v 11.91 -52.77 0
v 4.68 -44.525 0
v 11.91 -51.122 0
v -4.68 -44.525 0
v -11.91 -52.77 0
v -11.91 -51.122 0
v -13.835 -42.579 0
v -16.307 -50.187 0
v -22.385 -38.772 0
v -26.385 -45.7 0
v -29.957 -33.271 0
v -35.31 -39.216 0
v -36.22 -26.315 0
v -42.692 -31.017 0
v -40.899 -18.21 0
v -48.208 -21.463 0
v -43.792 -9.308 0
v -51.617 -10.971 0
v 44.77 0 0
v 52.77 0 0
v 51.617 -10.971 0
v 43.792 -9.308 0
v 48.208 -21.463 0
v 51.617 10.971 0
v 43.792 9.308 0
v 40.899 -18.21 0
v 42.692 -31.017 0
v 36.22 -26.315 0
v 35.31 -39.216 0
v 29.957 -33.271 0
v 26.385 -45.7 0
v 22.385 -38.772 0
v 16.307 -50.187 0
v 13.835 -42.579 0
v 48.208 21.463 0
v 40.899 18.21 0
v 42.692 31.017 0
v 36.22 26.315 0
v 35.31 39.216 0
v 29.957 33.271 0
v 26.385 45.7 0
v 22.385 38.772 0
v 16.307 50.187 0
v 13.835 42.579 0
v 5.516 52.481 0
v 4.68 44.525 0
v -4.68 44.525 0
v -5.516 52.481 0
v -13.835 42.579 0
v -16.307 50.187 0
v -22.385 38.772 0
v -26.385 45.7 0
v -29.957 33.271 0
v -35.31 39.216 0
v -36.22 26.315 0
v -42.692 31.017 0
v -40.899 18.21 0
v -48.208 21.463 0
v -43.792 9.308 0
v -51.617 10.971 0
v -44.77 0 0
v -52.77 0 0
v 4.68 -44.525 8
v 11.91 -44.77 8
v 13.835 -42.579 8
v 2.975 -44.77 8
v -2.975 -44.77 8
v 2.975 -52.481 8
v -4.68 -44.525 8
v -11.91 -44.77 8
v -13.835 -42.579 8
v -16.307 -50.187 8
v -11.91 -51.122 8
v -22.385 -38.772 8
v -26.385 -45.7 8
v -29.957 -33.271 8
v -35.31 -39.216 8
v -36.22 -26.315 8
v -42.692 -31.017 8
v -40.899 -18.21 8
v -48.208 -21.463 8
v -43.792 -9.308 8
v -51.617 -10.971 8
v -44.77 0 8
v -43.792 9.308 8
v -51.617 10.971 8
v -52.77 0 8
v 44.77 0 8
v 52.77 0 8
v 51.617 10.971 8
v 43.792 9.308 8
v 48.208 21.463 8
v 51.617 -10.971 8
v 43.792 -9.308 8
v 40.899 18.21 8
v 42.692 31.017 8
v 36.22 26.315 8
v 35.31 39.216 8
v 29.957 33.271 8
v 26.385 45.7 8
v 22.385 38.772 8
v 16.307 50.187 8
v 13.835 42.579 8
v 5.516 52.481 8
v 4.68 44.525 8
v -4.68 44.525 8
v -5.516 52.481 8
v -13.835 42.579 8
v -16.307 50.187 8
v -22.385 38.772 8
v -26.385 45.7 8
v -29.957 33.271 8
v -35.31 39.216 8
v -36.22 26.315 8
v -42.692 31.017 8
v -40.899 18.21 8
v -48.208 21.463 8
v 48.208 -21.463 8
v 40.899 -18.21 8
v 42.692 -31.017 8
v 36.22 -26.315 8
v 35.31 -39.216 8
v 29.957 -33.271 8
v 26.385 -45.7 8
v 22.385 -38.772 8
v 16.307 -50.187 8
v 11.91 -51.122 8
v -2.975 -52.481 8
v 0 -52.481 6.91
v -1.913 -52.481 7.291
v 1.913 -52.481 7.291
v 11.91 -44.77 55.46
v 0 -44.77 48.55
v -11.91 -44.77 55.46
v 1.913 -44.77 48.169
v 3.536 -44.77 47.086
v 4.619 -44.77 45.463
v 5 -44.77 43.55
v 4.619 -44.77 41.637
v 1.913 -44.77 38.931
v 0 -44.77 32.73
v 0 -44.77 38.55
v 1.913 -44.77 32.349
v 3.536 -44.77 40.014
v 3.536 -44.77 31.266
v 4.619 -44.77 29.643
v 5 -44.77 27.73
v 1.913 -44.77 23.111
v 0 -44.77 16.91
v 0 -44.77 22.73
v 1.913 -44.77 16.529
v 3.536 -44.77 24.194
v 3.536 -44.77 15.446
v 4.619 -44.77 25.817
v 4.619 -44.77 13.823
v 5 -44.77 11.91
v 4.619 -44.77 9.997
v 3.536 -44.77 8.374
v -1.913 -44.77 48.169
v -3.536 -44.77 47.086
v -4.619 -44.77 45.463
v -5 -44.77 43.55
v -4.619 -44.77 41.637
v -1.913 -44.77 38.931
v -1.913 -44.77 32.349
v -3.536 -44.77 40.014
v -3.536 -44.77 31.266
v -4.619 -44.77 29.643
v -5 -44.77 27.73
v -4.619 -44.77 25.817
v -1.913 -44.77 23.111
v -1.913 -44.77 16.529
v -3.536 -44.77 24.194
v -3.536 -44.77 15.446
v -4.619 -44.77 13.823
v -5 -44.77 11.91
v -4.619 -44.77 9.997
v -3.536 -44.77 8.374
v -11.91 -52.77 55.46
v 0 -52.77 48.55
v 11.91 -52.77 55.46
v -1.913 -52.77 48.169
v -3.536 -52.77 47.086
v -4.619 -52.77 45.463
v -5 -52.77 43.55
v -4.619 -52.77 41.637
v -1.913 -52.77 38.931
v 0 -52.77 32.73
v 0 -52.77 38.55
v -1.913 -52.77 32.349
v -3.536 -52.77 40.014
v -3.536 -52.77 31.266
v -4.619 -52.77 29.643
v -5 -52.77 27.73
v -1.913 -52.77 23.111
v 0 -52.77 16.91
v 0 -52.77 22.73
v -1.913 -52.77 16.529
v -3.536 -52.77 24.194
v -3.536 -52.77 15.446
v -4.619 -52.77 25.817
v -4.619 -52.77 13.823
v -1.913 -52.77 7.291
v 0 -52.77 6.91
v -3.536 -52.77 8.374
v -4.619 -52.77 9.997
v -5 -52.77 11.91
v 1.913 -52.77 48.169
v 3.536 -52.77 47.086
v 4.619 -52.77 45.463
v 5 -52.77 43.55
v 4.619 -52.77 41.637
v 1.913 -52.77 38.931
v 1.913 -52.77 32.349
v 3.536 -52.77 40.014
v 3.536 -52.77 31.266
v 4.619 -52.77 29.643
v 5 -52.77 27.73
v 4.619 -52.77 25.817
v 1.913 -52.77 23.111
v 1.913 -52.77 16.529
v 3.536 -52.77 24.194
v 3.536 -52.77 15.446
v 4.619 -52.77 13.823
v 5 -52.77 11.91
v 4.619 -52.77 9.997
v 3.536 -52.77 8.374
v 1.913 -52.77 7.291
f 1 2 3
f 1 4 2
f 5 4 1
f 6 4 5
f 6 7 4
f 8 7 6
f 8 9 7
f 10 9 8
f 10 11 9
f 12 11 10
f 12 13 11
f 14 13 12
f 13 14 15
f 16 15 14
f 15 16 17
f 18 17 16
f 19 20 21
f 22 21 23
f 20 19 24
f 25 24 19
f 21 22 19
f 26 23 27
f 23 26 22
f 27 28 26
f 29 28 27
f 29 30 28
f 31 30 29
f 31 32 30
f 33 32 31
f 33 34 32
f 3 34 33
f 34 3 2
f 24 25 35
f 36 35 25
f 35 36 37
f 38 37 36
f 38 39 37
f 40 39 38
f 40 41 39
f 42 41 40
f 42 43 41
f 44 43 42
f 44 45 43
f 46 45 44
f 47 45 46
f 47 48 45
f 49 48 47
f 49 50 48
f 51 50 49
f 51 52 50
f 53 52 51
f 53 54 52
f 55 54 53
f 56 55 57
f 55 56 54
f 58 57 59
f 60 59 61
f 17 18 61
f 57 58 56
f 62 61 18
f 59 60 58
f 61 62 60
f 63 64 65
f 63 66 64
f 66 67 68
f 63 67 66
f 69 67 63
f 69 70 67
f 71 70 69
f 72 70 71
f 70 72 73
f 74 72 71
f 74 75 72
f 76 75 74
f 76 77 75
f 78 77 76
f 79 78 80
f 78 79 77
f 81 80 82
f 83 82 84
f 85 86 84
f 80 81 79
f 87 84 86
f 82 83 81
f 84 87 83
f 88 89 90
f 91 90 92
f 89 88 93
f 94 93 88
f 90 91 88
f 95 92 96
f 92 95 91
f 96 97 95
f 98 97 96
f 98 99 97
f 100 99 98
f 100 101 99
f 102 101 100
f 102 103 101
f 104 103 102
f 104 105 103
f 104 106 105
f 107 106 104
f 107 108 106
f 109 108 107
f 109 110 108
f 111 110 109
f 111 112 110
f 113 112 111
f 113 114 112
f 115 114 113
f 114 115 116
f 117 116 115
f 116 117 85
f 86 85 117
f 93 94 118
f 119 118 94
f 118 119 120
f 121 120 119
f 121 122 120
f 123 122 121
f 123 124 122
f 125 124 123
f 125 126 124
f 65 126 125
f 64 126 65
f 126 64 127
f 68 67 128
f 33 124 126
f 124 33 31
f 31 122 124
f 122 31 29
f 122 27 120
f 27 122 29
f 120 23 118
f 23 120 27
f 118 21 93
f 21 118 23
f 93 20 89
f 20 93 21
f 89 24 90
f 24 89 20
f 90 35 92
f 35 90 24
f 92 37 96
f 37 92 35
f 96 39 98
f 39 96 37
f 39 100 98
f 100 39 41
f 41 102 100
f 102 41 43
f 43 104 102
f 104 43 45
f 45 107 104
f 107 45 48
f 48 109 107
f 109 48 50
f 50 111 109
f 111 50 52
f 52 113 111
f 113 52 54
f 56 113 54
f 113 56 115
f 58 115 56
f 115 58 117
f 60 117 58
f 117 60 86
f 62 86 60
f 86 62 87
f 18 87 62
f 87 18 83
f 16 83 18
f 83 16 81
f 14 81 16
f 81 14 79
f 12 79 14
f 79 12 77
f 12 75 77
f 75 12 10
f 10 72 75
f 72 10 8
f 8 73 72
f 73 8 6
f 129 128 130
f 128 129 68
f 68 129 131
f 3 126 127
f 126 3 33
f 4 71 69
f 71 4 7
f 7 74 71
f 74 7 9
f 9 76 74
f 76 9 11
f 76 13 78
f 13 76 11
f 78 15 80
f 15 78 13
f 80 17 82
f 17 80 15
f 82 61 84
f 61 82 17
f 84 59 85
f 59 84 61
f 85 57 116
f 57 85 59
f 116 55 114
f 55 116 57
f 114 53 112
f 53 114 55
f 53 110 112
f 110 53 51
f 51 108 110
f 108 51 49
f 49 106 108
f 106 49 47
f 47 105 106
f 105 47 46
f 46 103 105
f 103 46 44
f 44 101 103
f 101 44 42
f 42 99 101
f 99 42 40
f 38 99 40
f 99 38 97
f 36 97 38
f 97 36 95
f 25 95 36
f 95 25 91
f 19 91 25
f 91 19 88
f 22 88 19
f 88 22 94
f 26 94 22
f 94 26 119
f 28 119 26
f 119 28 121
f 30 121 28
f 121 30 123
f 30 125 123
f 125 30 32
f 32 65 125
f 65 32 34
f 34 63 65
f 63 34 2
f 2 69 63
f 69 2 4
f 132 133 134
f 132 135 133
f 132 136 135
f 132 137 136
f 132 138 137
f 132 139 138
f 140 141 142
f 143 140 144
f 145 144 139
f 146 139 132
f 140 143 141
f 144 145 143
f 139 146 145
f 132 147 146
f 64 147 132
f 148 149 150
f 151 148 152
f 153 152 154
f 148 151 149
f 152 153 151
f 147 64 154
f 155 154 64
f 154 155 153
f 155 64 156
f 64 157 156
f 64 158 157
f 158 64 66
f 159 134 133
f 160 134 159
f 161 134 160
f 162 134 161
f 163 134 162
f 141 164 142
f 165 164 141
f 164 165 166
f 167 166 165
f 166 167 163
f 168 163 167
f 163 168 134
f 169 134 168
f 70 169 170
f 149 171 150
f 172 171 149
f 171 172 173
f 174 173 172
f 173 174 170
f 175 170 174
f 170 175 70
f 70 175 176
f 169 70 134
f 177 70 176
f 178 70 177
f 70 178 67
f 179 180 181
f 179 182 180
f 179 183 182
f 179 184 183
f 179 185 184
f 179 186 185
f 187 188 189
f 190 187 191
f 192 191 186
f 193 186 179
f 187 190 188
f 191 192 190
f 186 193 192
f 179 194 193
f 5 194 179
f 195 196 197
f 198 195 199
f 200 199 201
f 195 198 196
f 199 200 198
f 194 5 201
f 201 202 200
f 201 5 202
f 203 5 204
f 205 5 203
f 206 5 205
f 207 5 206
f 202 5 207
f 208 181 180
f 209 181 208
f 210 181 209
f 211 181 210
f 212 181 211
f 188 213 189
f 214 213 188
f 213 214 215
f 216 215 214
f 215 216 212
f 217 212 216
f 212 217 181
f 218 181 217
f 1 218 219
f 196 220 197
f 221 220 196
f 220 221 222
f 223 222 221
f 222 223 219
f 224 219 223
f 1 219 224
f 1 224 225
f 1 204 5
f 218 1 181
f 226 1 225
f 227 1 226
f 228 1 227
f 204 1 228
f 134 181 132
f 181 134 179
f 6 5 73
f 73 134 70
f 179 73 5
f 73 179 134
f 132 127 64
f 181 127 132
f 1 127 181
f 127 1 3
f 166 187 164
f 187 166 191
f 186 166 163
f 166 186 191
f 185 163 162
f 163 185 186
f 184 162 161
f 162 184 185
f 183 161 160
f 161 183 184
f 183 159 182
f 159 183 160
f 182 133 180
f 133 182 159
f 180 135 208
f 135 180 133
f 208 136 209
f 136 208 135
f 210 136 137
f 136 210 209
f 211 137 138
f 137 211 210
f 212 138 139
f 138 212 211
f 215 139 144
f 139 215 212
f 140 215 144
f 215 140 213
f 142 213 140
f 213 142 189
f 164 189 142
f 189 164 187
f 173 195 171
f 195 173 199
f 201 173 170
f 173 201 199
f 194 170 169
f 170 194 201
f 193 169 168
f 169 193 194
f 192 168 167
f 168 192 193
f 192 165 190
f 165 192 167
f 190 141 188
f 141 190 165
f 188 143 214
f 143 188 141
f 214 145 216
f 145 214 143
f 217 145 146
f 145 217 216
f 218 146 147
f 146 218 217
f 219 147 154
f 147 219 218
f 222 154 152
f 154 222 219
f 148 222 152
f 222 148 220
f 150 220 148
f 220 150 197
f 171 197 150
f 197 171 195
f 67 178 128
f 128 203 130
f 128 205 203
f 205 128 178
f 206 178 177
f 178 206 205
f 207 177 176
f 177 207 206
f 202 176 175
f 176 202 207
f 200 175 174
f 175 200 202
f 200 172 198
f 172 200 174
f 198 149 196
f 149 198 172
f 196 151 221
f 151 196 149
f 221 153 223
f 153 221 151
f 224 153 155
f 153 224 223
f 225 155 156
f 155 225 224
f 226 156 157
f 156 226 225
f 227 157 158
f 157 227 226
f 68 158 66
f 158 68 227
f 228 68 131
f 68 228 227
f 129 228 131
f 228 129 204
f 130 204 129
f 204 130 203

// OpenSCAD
// OpenSCAD design for a mount to hold red solo cups
// that can attach to my server rack, for holding scraps
// from my 3d printer.

// Measurements
num_screws = 3;
screw_rad = 5;
screw_diff = 15.82;
cup_outer_rad = 49.33;
cup_edge_rad = 4.86;
thickness = 8;
margin = 0.3;

module holder() {
    linear_extrude(thickness) {
        difference() {
            circle(cup_outer_rad + thickness - (cup_edge_rad - margin));
            circle(cup_outer_rad - (cup_edge_rad - margin));
        }
    }
}

module screw_mount() {
    linear_extrude(thickness) {
        difference() {
            square([
                screw_diff + thickness,
                screw_diff * num_screws + thickness,
            ]);
            for (i = [0:num_screws - 1]) {
                translate([(screw_diff + thickness) / 2, i * screw_diff + (screw_diff + thickness) / 2, 0]) {
                    circle(screw_rad);
                }
            }
        }
    }
}

holder();

translate([-(screw_diff + thickness) / 2, -(cup_outer_rad - (cup_edge_rad - margin)), 0]) {
    rotate([90, 0, 0]) {
        screw_mount();
    }
}
